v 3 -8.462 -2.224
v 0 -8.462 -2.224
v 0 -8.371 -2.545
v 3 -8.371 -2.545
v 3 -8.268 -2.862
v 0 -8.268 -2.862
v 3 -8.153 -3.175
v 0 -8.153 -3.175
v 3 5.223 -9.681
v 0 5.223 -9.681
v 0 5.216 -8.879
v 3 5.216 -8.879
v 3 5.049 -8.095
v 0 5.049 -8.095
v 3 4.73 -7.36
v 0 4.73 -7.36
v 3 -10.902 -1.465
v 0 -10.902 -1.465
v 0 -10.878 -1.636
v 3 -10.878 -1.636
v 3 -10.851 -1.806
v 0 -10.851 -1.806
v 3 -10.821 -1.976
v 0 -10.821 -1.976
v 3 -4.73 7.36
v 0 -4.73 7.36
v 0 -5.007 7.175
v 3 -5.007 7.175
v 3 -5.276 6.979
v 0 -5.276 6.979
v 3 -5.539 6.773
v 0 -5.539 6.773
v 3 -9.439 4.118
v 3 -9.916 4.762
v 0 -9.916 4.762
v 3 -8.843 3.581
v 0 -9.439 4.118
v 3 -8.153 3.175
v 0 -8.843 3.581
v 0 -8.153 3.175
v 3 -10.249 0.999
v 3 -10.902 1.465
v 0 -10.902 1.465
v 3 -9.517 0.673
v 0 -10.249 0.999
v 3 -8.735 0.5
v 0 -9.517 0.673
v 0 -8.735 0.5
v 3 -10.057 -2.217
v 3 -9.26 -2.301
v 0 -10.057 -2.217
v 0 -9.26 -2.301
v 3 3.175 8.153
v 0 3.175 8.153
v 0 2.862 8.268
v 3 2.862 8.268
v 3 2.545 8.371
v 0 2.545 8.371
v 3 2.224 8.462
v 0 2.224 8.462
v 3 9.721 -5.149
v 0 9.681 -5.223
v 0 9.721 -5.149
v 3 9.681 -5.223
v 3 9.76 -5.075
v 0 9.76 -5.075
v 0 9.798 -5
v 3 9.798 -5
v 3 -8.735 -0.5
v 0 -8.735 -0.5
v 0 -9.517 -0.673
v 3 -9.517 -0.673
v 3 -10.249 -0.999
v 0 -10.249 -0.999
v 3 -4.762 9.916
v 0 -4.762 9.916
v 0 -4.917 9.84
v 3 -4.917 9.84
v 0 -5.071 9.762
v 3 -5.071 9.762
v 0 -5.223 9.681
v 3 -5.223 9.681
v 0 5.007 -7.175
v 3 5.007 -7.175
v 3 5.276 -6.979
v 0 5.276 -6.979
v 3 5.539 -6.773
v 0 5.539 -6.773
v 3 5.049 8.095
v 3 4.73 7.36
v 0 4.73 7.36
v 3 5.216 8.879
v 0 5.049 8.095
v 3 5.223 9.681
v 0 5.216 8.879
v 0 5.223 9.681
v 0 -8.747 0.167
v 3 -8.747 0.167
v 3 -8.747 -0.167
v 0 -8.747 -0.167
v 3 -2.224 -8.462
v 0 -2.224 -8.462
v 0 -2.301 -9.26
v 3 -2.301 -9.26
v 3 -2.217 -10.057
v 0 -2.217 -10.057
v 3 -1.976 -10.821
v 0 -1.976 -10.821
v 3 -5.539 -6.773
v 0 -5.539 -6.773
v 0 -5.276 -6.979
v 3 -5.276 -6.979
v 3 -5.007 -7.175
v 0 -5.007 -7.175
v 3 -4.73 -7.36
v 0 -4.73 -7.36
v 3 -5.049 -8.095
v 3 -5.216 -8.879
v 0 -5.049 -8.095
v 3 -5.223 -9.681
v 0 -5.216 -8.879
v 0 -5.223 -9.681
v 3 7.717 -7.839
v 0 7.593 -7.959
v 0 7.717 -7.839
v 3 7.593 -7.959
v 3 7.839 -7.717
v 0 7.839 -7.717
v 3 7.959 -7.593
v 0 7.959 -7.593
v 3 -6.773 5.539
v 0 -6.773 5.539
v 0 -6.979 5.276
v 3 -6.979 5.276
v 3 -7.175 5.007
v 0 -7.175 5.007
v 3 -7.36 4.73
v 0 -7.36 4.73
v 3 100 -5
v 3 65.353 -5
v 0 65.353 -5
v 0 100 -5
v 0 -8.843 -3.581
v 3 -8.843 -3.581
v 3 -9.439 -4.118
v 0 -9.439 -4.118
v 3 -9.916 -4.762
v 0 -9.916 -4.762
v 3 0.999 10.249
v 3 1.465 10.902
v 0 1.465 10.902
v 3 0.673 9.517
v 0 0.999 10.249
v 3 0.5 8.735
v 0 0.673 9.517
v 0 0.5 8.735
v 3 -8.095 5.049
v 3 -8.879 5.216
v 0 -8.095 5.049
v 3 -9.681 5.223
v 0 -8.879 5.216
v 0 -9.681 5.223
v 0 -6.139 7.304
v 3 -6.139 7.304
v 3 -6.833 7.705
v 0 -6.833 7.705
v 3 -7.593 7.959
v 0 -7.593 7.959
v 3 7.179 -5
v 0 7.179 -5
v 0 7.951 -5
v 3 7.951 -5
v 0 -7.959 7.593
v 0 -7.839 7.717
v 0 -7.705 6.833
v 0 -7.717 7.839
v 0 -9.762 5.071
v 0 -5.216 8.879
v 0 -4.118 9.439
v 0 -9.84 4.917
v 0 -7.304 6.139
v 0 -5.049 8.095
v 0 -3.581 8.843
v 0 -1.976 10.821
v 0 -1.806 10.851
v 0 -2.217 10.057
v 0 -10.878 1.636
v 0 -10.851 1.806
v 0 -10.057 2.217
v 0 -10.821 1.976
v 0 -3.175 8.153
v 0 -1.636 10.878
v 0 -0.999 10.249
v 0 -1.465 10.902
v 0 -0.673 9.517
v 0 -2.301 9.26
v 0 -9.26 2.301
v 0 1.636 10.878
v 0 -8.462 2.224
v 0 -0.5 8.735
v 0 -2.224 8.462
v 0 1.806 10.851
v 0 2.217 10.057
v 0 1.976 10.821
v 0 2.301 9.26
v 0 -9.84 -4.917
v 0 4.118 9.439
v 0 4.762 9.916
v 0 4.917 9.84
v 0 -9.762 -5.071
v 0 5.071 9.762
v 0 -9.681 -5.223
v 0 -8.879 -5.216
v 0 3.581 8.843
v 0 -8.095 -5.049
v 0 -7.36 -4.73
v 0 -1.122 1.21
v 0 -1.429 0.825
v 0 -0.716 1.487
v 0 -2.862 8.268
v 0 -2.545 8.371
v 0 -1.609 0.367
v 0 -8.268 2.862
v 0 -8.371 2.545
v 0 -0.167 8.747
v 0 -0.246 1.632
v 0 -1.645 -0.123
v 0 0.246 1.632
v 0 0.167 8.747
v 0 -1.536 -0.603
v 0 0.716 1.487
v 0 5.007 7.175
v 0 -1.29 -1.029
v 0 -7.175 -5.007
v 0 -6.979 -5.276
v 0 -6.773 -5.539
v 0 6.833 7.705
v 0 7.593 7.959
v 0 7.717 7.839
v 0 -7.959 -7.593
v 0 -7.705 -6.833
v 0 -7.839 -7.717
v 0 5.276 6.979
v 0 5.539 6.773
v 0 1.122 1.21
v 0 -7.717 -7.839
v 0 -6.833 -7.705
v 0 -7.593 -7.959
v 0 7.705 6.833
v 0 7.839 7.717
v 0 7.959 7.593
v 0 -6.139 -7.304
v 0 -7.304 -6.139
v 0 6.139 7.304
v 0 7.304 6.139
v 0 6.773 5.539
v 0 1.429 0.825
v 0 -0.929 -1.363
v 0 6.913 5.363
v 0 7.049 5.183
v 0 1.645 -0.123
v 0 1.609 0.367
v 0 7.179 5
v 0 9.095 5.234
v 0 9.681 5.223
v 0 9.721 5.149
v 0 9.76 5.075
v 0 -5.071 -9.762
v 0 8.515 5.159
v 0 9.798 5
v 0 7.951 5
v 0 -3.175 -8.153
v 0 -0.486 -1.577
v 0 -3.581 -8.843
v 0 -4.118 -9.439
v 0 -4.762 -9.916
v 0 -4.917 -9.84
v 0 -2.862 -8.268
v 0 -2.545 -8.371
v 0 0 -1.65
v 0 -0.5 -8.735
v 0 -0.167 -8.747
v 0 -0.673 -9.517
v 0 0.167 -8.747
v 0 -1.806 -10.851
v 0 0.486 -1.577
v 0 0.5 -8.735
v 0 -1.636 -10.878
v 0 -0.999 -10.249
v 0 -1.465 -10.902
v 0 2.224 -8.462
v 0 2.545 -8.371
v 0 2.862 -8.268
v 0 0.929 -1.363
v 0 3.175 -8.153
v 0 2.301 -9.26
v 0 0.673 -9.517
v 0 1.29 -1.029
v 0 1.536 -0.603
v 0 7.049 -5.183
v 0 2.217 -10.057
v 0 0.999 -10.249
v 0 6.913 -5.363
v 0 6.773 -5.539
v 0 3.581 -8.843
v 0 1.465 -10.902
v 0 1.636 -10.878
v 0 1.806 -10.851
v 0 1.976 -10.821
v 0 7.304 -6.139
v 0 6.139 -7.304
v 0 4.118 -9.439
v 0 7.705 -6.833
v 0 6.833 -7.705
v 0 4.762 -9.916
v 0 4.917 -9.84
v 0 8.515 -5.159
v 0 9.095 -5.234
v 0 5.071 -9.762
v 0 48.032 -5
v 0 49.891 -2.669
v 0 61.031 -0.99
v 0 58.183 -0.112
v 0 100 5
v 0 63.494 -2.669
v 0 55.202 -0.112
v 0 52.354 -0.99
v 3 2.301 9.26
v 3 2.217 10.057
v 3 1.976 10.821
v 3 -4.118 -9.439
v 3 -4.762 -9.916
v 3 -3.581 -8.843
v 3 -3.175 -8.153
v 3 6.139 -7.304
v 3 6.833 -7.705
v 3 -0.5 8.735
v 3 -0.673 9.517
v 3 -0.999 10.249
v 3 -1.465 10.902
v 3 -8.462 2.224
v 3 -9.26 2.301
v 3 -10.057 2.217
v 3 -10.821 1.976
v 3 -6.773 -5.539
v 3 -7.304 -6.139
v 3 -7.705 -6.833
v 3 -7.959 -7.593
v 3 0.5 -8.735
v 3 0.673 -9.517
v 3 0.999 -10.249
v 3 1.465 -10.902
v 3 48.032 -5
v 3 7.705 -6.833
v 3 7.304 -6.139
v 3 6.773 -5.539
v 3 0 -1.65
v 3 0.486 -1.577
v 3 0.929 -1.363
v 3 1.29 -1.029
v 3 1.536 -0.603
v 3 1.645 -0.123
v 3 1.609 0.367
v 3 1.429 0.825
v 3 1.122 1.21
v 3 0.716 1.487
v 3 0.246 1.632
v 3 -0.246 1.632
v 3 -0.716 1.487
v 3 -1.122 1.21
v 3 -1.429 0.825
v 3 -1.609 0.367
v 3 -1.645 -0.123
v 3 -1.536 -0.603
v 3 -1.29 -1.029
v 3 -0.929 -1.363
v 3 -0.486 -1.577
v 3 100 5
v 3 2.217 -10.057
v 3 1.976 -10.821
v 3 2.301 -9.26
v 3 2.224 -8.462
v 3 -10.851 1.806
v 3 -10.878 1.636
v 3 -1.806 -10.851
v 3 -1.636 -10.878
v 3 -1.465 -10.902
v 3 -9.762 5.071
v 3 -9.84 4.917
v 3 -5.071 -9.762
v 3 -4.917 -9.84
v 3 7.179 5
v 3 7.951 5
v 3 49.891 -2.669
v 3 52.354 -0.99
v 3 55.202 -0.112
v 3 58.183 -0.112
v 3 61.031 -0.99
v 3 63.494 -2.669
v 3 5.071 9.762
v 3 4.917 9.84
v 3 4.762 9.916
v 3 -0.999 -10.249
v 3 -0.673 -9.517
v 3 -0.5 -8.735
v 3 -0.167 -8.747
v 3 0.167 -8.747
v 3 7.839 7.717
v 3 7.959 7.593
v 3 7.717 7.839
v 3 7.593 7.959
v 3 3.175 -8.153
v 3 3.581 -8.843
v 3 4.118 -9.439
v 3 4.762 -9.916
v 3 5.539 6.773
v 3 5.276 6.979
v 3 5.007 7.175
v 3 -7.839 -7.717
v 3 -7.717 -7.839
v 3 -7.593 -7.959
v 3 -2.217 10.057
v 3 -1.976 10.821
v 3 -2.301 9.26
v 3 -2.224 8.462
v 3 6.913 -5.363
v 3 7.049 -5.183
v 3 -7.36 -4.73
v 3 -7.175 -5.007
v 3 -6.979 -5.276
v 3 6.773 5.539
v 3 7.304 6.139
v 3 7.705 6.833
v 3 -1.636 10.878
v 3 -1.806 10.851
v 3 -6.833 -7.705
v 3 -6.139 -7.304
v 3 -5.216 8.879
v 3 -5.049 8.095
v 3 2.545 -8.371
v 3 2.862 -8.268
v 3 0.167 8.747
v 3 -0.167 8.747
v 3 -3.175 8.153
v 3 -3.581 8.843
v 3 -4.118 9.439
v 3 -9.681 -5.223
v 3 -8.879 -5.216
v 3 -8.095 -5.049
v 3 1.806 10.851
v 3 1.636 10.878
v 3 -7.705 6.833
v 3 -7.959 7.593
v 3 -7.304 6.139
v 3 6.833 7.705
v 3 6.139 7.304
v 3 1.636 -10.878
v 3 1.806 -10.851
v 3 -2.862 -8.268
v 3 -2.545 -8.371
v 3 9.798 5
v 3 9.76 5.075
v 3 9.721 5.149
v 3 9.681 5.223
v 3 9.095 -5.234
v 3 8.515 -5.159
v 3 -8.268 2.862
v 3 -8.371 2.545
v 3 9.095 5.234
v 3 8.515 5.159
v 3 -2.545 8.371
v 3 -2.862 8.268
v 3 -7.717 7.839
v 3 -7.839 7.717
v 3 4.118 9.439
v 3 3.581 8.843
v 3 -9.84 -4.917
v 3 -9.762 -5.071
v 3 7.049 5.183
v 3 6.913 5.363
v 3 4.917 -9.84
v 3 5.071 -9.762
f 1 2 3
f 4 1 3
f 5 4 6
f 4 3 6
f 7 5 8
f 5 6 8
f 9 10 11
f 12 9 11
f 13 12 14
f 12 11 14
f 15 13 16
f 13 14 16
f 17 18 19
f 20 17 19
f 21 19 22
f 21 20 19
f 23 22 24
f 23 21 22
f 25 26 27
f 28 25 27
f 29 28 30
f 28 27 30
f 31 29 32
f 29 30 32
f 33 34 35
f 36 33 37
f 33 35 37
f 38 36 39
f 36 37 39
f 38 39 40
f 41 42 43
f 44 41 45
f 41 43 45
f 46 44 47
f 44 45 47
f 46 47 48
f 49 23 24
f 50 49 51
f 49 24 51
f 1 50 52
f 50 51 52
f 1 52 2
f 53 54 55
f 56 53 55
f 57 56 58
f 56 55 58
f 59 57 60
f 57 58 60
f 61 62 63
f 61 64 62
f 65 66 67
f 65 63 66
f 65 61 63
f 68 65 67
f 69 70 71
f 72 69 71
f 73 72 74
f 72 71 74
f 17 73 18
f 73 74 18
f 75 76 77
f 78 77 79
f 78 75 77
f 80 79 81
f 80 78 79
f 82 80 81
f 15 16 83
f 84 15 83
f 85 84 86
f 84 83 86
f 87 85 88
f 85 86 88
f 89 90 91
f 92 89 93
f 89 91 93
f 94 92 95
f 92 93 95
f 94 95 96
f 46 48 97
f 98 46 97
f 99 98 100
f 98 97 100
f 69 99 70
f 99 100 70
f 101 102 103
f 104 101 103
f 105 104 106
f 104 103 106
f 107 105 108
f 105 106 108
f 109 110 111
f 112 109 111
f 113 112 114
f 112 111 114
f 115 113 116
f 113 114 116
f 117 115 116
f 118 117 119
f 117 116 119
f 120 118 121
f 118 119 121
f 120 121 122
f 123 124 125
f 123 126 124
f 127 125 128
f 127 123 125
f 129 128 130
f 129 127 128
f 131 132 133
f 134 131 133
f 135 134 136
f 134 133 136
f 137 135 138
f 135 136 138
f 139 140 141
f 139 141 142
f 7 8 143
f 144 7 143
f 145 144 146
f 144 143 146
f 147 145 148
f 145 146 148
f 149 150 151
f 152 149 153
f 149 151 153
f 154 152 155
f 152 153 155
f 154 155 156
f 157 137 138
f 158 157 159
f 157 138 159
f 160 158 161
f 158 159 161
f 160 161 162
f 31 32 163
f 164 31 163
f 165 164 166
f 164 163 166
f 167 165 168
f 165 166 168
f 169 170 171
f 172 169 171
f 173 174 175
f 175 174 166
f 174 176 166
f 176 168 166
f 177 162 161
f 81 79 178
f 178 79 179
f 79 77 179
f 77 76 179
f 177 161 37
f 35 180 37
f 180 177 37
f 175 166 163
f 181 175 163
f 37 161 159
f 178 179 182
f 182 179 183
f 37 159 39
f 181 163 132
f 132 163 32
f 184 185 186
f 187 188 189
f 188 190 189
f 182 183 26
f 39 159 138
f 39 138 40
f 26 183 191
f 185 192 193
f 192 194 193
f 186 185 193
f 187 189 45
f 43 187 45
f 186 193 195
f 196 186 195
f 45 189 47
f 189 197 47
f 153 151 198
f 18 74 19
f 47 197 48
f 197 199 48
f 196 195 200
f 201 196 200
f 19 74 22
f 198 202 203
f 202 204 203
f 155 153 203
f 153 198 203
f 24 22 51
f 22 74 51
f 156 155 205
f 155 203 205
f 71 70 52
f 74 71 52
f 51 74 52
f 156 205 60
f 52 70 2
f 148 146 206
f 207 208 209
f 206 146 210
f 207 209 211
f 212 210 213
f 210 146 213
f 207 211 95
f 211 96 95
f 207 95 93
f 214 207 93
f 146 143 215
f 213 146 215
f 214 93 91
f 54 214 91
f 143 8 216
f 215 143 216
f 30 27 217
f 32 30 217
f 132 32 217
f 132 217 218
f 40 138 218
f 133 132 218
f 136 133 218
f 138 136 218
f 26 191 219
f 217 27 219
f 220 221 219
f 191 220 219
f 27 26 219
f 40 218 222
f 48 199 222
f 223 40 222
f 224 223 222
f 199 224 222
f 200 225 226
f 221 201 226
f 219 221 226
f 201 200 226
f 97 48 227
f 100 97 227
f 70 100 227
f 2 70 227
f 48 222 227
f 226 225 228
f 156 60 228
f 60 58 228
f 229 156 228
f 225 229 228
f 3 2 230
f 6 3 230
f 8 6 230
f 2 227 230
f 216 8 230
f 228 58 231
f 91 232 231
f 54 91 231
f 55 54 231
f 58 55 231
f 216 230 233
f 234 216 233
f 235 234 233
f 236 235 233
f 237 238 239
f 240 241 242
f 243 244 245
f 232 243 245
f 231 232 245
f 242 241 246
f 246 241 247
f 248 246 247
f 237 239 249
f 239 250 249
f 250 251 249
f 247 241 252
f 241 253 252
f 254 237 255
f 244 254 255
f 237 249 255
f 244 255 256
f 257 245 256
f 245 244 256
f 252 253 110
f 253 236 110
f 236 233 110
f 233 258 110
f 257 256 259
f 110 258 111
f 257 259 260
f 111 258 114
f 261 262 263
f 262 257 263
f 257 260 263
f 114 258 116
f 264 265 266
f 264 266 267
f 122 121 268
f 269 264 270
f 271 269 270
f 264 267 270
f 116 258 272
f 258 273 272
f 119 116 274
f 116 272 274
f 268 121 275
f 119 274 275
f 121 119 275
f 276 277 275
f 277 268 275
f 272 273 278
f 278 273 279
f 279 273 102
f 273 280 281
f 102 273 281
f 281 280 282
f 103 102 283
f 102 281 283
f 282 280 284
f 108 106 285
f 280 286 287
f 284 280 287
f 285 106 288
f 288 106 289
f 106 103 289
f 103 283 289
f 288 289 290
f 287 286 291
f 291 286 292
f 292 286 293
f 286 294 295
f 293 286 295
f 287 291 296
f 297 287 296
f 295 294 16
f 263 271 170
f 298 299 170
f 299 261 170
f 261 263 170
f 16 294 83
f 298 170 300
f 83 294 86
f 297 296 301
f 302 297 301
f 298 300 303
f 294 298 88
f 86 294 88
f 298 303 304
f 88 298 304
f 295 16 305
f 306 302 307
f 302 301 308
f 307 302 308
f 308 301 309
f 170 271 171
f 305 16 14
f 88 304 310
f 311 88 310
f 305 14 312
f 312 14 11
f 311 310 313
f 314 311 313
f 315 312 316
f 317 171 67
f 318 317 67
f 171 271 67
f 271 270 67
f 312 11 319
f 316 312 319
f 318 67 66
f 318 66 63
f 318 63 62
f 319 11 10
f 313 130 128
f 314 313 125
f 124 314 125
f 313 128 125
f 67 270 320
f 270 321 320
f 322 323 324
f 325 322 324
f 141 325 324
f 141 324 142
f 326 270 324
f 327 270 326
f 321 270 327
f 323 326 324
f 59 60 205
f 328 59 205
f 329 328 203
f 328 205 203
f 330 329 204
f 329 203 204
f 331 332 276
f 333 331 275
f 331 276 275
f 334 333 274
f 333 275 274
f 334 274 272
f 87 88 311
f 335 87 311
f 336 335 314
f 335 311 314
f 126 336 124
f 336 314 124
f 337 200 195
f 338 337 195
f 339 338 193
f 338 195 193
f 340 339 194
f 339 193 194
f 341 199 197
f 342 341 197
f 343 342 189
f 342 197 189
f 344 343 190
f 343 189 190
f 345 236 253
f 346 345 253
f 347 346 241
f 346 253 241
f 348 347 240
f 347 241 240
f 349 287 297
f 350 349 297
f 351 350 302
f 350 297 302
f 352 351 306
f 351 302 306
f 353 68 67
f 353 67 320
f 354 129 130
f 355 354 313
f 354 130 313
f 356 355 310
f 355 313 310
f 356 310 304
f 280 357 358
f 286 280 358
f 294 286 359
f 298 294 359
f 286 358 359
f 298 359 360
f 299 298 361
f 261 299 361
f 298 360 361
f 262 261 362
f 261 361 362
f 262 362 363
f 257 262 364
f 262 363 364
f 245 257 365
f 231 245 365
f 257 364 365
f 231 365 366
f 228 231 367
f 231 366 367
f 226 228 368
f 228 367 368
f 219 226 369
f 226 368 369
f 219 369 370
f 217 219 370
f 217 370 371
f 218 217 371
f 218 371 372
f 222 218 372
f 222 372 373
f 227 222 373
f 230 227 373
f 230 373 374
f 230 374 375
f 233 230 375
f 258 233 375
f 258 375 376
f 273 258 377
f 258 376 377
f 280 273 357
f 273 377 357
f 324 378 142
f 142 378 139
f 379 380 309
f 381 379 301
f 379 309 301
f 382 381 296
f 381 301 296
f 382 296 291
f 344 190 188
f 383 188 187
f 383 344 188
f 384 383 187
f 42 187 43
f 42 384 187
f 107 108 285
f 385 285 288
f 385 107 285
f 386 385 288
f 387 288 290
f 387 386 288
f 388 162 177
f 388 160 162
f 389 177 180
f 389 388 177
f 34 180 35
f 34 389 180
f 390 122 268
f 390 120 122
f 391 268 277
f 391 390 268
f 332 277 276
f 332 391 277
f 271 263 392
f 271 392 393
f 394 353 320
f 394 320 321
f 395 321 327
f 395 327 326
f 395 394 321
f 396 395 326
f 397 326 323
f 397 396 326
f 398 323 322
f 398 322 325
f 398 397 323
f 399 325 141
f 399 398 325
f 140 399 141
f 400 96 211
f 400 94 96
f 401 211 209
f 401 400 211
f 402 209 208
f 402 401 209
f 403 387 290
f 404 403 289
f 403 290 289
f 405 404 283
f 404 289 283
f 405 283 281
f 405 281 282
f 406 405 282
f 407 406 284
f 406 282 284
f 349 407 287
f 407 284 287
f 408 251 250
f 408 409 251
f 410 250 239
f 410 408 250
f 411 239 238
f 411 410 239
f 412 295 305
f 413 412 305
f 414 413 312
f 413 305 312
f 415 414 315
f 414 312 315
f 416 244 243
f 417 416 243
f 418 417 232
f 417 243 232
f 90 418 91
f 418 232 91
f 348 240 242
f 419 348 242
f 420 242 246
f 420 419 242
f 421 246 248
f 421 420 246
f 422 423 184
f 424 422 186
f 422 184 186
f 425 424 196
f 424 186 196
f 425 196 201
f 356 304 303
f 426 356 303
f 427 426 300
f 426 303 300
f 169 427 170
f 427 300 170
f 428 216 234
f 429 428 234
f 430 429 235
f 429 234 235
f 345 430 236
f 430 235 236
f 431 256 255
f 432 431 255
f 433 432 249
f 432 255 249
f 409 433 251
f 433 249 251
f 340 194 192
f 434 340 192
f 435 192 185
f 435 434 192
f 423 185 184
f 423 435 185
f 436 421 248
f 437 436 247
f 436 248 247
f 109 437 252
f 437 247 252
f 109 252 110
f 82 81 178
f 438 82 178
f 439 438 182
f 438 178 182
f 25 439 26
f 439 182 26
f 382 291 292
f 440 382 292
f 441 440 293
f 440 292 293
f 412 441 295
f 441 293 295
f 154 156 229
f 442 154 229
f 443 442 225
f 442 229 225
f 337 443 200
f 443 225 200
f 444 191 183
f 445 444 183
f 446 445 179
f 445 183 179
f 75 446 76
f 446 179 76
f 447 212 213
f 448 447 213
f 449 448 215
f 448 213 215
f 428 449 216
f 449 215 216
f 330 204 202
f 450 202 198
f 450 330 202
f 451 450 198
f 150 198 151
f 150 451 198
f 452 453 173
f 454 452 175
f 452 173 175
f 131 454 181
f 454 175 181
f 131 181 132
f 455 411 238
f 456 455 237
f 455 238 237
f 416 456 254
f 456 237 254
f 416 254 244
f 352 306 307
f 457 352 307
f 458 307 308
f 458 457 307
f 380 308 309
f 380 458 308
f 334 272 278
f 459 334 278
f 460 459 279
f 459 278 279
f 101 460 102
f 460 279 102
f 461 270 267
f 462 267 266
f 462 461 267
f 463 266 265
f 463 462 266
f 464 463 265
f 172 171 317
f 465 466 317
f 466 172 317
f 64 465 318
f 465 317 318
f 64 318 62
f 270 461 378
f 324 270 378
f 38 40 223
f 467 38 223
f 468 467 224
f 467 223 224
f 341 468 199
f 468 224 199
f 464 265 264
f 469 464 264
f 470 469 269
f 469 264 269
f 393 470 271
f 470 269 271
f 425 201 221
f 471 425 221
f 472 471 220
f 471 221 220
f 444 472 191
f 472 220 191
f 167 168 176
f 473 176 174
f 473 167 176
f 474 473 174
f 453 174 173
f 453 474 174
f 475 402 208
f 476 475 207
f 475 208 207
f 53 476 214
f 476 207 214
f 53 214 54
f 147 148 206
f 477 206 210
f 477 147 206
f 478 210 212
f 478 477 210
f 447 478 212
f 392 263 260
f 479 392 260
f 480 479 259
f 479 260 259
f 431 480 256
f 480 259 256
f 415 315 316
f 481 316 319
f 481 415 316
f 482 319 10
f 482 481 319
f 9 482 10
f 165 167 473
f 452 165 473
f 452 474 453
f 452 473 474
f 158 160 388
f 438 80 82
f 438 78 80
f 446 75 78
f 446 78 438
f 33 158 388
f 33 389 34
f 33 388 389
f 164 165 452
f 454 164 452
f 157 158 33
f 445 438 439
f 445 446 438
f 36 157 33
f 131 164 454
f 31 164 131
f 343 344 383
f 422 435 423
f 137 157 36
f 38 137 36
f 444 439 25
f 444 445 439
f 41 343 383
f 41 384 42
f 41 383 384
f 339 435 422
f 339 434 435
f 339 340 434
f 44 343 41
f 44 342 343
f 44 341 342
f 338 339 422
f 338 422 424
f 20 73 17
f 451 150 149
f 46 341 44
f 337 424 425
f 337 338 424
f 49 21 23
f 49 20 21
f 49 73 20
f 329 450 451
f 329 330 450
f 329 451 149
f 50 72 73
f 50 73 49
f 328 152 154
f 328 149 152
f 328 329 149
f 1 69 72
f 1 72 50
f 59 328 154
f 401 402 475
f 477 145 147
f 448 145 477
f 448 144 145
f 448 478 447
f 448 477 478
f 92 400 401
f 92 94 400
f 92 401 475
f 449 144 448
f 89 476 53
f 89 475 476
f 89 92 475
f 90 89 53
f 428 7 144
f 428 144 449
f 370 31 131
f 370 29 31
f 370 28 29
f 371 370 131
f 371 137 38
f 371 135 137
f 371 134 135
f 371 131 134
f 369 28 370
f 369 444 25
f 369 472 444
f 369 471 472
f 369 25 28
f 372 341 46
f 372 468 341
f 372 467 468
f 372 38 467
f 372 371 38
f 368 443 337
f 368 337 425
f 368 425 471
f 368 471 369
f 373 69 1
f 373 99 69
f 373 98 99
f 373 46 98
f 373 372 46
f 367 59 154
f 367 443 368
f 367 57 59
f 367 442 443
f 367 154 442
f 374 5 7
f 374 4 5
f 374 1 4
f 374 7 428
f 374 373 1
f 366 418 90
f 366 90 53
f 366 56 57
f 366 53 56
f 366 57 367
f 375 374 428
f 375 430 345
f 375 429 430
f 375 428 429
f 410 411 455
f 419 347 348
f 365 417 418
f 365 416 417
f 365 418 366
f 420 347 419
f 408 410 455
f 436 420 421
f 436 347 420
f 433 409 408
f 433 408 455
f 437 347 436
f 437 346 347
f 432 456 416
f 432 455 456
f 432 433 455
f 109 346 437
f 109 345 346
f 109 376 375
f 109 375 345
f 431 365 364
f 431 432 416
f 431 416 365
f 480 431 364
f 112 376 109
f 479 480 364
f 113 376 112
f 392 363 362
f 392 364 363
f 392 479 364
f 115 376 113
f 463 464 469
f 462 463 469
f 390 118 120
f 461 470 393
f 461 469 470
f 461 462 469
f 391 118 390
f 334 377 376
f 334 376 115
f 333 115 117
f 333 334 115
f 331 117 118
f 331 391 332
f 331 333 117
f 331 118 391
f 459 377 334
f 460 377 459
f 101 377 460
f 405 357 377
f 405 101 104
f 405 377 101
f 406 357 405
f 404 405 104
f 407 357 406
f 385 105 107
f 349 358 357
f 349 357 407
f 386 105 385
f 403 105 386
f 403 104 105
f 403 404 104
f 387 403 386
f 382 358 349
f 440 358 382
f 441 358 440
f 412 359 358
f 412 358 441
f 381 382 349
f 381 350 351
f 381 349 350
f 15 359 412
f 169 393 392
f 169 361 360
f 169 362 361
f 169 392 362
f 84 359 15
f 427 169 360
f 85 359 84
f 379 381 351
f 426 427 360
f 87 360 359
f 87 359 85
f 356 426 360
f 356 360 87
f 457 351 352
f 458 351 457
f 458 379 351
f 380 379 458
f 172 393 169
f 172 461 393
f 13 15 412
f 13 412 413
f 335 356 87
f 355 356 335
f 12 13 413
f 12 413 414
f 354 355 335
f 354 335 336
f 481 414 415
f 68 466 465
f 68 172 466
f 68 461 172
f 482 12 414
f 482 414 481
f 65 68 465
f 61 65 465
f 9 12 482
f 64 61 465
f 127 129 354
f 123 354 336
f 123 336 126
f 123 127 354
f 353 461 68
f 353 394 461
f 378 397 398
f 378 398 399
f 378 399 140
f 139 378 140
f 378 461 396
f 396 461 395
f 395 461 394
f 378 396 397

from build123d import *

# Parameters (mm, degrees)
BASPROSKE_W         = 3
BASPROSKE_H         = 11
TOOTHCUT_DEPTH      = 16.842979518
TEETHCUTS_COUNT     = 20
TEETHCUTS_ANGLE     = 342
BORSKE_R            = 2.5
BORE_DEPTH          = 50.0000508
SKETCH1_W           = 10
SKETCH1_H           = 100
BOSS_EXTRUDE1_DEPTH = 3
CUT_EXTRUDE1_DEPTH  = 3
CUT_EXTRUDE2_DEPTH  = 3
SKETCH6_R           = 2.5
SKETCH6_R_2         = 1.65
BOSS_EXTRUDE2_DEPTH = 3


with BuildPart() as part:
    # BasProSke → Base-Revolve (revolve)
    with BuildSketch(Plane(origin=(0, 0, 0), x_dir=(1, 0, 0), z_dir=(0, 1, 0)), mode=Mode.PRIVATE) as base_revolve_sk:
        with Locations((1.5, 5.5)):
            Rectangle(BASPROSKE_W, BASPROSKE_H)
    revolve(base_revolve_sk.sketch.rotate(Axis((-10, 0, 0), (1, 0, 0)), 180), axis=Axis((-10, 0, 0), (1, 0, 0)))

    # TooCutSke → ToothCut (cut, through all)
    with BuildSketch(Plane(origin=(0, 0, 0), x_dir=(0, 0, -1), z_dir=(1, 0, 0))):
        with BuildLine():
            ThreePointArc((0.499924007, 8.734705318), (0, 8.749), (-0.499924007, 8.734705318))
            ThreePointArc((-0.499924007, 8.734705318), (-0.824302243, 9.905497836), (-1.485192705, 10.924909509))
            ThreePointArc((-1.485192705, 10.924909509), (0, 11.0254), (1.485192705, 10.924909509))
            ThreePointArc((1.485192705, 10.924909509), (0.824302243, 9.905497836), (0.499924007, 8.734705318))
        make_face()
    toothcut = extrude(amount=TOOTHCUT_DEPTH, mode=Mode.SUBTRACT)

    # TeethCuts: ToothCut ×20 about axis
    teethcuts_axis = Axis((-10, 0, 0), (1, 0, 0))
    for i in range(1, TEETHCUTS_COUNT):
        add(toothcut.rotate(teethcuts_axis, i * TEETHCUTS_ANGLE / (TEETHCUTS_COUNT - 1)), mode=Mode.SUBTRACT)

    # BorSke → Bore (cut, symmetric)
    with BuildSketch(Plane(origin=(0, 0, 0), x_dir=(0, 0, -1), z_dir=(1, 0, 0))):
        with Locations(Location((0, 0, 0), (0, 0, 180))):
            Circle(BORSKE_R)
    extrude(amount=BORE_DEPTH, both=True, mode=Mode.SUBTRACT)

    # Sketch1 → Boss-Extrude1 (add)
    with BuildSketch(Plane(origin=(3, 0, 0), x_dir=(0, 0, -1), z_dir=(1, 0, 0))):
        with Locations((0, 50)):
            Rectangle(SKETCH1_W, SKETCH1_H)
    extrude(amount=-BOSS_EXTRUDE1_DEPTH)

    # Sketch4 → Cut-Extrude1 (cut)
    with BuildSketch(Plane(origin=(3, 0, 0), x_dir=(0, 0, -1), z_dir=(1, 0, 0))):
        with BuildLine():
            Line((5, 65.352905548), (5, 48.032397472))
            ThreePointArc((5, 48.032397472), (0, 56.69265151), (5, 65.352905548))
        make_face()
    extrude(amount=-CUT_EXTRUDE1_DEPTH, mode=Mode.SUBTRACT)

    # Sketch5 → Cut-Extrude2 (cut)
    with BuildSketch(Plane(origin=(3, 0, 0), x_dir=(0, 0, -1), z_dir=(1, 0, 0))):
        with BuildLine():
            Line((2.5, 0), (-2.5, 0))
            ThreePointArc((-2.5, 0), (0, 2.5), (2.5, 0))
        make_face()
    extrude(amount=-CUT_EXTRUDE2_DEPTH, mode=Mode.SUBTRACT)

    # Sketch6 → Boss-Extrude2 (add)
    with BuildSketch(Plane(origin=(3, 0, 0), x_dir=(0, 0, -1), z_dir=(1, 0, 0))):
        Circle(SKETCH6_R)
        Circle(SKETCH6_R_2, mode=Mode.SUBTRACT)
    extrude(amount=-BOSS_EXTRUDE2_DEPTH)


solid = part.part
